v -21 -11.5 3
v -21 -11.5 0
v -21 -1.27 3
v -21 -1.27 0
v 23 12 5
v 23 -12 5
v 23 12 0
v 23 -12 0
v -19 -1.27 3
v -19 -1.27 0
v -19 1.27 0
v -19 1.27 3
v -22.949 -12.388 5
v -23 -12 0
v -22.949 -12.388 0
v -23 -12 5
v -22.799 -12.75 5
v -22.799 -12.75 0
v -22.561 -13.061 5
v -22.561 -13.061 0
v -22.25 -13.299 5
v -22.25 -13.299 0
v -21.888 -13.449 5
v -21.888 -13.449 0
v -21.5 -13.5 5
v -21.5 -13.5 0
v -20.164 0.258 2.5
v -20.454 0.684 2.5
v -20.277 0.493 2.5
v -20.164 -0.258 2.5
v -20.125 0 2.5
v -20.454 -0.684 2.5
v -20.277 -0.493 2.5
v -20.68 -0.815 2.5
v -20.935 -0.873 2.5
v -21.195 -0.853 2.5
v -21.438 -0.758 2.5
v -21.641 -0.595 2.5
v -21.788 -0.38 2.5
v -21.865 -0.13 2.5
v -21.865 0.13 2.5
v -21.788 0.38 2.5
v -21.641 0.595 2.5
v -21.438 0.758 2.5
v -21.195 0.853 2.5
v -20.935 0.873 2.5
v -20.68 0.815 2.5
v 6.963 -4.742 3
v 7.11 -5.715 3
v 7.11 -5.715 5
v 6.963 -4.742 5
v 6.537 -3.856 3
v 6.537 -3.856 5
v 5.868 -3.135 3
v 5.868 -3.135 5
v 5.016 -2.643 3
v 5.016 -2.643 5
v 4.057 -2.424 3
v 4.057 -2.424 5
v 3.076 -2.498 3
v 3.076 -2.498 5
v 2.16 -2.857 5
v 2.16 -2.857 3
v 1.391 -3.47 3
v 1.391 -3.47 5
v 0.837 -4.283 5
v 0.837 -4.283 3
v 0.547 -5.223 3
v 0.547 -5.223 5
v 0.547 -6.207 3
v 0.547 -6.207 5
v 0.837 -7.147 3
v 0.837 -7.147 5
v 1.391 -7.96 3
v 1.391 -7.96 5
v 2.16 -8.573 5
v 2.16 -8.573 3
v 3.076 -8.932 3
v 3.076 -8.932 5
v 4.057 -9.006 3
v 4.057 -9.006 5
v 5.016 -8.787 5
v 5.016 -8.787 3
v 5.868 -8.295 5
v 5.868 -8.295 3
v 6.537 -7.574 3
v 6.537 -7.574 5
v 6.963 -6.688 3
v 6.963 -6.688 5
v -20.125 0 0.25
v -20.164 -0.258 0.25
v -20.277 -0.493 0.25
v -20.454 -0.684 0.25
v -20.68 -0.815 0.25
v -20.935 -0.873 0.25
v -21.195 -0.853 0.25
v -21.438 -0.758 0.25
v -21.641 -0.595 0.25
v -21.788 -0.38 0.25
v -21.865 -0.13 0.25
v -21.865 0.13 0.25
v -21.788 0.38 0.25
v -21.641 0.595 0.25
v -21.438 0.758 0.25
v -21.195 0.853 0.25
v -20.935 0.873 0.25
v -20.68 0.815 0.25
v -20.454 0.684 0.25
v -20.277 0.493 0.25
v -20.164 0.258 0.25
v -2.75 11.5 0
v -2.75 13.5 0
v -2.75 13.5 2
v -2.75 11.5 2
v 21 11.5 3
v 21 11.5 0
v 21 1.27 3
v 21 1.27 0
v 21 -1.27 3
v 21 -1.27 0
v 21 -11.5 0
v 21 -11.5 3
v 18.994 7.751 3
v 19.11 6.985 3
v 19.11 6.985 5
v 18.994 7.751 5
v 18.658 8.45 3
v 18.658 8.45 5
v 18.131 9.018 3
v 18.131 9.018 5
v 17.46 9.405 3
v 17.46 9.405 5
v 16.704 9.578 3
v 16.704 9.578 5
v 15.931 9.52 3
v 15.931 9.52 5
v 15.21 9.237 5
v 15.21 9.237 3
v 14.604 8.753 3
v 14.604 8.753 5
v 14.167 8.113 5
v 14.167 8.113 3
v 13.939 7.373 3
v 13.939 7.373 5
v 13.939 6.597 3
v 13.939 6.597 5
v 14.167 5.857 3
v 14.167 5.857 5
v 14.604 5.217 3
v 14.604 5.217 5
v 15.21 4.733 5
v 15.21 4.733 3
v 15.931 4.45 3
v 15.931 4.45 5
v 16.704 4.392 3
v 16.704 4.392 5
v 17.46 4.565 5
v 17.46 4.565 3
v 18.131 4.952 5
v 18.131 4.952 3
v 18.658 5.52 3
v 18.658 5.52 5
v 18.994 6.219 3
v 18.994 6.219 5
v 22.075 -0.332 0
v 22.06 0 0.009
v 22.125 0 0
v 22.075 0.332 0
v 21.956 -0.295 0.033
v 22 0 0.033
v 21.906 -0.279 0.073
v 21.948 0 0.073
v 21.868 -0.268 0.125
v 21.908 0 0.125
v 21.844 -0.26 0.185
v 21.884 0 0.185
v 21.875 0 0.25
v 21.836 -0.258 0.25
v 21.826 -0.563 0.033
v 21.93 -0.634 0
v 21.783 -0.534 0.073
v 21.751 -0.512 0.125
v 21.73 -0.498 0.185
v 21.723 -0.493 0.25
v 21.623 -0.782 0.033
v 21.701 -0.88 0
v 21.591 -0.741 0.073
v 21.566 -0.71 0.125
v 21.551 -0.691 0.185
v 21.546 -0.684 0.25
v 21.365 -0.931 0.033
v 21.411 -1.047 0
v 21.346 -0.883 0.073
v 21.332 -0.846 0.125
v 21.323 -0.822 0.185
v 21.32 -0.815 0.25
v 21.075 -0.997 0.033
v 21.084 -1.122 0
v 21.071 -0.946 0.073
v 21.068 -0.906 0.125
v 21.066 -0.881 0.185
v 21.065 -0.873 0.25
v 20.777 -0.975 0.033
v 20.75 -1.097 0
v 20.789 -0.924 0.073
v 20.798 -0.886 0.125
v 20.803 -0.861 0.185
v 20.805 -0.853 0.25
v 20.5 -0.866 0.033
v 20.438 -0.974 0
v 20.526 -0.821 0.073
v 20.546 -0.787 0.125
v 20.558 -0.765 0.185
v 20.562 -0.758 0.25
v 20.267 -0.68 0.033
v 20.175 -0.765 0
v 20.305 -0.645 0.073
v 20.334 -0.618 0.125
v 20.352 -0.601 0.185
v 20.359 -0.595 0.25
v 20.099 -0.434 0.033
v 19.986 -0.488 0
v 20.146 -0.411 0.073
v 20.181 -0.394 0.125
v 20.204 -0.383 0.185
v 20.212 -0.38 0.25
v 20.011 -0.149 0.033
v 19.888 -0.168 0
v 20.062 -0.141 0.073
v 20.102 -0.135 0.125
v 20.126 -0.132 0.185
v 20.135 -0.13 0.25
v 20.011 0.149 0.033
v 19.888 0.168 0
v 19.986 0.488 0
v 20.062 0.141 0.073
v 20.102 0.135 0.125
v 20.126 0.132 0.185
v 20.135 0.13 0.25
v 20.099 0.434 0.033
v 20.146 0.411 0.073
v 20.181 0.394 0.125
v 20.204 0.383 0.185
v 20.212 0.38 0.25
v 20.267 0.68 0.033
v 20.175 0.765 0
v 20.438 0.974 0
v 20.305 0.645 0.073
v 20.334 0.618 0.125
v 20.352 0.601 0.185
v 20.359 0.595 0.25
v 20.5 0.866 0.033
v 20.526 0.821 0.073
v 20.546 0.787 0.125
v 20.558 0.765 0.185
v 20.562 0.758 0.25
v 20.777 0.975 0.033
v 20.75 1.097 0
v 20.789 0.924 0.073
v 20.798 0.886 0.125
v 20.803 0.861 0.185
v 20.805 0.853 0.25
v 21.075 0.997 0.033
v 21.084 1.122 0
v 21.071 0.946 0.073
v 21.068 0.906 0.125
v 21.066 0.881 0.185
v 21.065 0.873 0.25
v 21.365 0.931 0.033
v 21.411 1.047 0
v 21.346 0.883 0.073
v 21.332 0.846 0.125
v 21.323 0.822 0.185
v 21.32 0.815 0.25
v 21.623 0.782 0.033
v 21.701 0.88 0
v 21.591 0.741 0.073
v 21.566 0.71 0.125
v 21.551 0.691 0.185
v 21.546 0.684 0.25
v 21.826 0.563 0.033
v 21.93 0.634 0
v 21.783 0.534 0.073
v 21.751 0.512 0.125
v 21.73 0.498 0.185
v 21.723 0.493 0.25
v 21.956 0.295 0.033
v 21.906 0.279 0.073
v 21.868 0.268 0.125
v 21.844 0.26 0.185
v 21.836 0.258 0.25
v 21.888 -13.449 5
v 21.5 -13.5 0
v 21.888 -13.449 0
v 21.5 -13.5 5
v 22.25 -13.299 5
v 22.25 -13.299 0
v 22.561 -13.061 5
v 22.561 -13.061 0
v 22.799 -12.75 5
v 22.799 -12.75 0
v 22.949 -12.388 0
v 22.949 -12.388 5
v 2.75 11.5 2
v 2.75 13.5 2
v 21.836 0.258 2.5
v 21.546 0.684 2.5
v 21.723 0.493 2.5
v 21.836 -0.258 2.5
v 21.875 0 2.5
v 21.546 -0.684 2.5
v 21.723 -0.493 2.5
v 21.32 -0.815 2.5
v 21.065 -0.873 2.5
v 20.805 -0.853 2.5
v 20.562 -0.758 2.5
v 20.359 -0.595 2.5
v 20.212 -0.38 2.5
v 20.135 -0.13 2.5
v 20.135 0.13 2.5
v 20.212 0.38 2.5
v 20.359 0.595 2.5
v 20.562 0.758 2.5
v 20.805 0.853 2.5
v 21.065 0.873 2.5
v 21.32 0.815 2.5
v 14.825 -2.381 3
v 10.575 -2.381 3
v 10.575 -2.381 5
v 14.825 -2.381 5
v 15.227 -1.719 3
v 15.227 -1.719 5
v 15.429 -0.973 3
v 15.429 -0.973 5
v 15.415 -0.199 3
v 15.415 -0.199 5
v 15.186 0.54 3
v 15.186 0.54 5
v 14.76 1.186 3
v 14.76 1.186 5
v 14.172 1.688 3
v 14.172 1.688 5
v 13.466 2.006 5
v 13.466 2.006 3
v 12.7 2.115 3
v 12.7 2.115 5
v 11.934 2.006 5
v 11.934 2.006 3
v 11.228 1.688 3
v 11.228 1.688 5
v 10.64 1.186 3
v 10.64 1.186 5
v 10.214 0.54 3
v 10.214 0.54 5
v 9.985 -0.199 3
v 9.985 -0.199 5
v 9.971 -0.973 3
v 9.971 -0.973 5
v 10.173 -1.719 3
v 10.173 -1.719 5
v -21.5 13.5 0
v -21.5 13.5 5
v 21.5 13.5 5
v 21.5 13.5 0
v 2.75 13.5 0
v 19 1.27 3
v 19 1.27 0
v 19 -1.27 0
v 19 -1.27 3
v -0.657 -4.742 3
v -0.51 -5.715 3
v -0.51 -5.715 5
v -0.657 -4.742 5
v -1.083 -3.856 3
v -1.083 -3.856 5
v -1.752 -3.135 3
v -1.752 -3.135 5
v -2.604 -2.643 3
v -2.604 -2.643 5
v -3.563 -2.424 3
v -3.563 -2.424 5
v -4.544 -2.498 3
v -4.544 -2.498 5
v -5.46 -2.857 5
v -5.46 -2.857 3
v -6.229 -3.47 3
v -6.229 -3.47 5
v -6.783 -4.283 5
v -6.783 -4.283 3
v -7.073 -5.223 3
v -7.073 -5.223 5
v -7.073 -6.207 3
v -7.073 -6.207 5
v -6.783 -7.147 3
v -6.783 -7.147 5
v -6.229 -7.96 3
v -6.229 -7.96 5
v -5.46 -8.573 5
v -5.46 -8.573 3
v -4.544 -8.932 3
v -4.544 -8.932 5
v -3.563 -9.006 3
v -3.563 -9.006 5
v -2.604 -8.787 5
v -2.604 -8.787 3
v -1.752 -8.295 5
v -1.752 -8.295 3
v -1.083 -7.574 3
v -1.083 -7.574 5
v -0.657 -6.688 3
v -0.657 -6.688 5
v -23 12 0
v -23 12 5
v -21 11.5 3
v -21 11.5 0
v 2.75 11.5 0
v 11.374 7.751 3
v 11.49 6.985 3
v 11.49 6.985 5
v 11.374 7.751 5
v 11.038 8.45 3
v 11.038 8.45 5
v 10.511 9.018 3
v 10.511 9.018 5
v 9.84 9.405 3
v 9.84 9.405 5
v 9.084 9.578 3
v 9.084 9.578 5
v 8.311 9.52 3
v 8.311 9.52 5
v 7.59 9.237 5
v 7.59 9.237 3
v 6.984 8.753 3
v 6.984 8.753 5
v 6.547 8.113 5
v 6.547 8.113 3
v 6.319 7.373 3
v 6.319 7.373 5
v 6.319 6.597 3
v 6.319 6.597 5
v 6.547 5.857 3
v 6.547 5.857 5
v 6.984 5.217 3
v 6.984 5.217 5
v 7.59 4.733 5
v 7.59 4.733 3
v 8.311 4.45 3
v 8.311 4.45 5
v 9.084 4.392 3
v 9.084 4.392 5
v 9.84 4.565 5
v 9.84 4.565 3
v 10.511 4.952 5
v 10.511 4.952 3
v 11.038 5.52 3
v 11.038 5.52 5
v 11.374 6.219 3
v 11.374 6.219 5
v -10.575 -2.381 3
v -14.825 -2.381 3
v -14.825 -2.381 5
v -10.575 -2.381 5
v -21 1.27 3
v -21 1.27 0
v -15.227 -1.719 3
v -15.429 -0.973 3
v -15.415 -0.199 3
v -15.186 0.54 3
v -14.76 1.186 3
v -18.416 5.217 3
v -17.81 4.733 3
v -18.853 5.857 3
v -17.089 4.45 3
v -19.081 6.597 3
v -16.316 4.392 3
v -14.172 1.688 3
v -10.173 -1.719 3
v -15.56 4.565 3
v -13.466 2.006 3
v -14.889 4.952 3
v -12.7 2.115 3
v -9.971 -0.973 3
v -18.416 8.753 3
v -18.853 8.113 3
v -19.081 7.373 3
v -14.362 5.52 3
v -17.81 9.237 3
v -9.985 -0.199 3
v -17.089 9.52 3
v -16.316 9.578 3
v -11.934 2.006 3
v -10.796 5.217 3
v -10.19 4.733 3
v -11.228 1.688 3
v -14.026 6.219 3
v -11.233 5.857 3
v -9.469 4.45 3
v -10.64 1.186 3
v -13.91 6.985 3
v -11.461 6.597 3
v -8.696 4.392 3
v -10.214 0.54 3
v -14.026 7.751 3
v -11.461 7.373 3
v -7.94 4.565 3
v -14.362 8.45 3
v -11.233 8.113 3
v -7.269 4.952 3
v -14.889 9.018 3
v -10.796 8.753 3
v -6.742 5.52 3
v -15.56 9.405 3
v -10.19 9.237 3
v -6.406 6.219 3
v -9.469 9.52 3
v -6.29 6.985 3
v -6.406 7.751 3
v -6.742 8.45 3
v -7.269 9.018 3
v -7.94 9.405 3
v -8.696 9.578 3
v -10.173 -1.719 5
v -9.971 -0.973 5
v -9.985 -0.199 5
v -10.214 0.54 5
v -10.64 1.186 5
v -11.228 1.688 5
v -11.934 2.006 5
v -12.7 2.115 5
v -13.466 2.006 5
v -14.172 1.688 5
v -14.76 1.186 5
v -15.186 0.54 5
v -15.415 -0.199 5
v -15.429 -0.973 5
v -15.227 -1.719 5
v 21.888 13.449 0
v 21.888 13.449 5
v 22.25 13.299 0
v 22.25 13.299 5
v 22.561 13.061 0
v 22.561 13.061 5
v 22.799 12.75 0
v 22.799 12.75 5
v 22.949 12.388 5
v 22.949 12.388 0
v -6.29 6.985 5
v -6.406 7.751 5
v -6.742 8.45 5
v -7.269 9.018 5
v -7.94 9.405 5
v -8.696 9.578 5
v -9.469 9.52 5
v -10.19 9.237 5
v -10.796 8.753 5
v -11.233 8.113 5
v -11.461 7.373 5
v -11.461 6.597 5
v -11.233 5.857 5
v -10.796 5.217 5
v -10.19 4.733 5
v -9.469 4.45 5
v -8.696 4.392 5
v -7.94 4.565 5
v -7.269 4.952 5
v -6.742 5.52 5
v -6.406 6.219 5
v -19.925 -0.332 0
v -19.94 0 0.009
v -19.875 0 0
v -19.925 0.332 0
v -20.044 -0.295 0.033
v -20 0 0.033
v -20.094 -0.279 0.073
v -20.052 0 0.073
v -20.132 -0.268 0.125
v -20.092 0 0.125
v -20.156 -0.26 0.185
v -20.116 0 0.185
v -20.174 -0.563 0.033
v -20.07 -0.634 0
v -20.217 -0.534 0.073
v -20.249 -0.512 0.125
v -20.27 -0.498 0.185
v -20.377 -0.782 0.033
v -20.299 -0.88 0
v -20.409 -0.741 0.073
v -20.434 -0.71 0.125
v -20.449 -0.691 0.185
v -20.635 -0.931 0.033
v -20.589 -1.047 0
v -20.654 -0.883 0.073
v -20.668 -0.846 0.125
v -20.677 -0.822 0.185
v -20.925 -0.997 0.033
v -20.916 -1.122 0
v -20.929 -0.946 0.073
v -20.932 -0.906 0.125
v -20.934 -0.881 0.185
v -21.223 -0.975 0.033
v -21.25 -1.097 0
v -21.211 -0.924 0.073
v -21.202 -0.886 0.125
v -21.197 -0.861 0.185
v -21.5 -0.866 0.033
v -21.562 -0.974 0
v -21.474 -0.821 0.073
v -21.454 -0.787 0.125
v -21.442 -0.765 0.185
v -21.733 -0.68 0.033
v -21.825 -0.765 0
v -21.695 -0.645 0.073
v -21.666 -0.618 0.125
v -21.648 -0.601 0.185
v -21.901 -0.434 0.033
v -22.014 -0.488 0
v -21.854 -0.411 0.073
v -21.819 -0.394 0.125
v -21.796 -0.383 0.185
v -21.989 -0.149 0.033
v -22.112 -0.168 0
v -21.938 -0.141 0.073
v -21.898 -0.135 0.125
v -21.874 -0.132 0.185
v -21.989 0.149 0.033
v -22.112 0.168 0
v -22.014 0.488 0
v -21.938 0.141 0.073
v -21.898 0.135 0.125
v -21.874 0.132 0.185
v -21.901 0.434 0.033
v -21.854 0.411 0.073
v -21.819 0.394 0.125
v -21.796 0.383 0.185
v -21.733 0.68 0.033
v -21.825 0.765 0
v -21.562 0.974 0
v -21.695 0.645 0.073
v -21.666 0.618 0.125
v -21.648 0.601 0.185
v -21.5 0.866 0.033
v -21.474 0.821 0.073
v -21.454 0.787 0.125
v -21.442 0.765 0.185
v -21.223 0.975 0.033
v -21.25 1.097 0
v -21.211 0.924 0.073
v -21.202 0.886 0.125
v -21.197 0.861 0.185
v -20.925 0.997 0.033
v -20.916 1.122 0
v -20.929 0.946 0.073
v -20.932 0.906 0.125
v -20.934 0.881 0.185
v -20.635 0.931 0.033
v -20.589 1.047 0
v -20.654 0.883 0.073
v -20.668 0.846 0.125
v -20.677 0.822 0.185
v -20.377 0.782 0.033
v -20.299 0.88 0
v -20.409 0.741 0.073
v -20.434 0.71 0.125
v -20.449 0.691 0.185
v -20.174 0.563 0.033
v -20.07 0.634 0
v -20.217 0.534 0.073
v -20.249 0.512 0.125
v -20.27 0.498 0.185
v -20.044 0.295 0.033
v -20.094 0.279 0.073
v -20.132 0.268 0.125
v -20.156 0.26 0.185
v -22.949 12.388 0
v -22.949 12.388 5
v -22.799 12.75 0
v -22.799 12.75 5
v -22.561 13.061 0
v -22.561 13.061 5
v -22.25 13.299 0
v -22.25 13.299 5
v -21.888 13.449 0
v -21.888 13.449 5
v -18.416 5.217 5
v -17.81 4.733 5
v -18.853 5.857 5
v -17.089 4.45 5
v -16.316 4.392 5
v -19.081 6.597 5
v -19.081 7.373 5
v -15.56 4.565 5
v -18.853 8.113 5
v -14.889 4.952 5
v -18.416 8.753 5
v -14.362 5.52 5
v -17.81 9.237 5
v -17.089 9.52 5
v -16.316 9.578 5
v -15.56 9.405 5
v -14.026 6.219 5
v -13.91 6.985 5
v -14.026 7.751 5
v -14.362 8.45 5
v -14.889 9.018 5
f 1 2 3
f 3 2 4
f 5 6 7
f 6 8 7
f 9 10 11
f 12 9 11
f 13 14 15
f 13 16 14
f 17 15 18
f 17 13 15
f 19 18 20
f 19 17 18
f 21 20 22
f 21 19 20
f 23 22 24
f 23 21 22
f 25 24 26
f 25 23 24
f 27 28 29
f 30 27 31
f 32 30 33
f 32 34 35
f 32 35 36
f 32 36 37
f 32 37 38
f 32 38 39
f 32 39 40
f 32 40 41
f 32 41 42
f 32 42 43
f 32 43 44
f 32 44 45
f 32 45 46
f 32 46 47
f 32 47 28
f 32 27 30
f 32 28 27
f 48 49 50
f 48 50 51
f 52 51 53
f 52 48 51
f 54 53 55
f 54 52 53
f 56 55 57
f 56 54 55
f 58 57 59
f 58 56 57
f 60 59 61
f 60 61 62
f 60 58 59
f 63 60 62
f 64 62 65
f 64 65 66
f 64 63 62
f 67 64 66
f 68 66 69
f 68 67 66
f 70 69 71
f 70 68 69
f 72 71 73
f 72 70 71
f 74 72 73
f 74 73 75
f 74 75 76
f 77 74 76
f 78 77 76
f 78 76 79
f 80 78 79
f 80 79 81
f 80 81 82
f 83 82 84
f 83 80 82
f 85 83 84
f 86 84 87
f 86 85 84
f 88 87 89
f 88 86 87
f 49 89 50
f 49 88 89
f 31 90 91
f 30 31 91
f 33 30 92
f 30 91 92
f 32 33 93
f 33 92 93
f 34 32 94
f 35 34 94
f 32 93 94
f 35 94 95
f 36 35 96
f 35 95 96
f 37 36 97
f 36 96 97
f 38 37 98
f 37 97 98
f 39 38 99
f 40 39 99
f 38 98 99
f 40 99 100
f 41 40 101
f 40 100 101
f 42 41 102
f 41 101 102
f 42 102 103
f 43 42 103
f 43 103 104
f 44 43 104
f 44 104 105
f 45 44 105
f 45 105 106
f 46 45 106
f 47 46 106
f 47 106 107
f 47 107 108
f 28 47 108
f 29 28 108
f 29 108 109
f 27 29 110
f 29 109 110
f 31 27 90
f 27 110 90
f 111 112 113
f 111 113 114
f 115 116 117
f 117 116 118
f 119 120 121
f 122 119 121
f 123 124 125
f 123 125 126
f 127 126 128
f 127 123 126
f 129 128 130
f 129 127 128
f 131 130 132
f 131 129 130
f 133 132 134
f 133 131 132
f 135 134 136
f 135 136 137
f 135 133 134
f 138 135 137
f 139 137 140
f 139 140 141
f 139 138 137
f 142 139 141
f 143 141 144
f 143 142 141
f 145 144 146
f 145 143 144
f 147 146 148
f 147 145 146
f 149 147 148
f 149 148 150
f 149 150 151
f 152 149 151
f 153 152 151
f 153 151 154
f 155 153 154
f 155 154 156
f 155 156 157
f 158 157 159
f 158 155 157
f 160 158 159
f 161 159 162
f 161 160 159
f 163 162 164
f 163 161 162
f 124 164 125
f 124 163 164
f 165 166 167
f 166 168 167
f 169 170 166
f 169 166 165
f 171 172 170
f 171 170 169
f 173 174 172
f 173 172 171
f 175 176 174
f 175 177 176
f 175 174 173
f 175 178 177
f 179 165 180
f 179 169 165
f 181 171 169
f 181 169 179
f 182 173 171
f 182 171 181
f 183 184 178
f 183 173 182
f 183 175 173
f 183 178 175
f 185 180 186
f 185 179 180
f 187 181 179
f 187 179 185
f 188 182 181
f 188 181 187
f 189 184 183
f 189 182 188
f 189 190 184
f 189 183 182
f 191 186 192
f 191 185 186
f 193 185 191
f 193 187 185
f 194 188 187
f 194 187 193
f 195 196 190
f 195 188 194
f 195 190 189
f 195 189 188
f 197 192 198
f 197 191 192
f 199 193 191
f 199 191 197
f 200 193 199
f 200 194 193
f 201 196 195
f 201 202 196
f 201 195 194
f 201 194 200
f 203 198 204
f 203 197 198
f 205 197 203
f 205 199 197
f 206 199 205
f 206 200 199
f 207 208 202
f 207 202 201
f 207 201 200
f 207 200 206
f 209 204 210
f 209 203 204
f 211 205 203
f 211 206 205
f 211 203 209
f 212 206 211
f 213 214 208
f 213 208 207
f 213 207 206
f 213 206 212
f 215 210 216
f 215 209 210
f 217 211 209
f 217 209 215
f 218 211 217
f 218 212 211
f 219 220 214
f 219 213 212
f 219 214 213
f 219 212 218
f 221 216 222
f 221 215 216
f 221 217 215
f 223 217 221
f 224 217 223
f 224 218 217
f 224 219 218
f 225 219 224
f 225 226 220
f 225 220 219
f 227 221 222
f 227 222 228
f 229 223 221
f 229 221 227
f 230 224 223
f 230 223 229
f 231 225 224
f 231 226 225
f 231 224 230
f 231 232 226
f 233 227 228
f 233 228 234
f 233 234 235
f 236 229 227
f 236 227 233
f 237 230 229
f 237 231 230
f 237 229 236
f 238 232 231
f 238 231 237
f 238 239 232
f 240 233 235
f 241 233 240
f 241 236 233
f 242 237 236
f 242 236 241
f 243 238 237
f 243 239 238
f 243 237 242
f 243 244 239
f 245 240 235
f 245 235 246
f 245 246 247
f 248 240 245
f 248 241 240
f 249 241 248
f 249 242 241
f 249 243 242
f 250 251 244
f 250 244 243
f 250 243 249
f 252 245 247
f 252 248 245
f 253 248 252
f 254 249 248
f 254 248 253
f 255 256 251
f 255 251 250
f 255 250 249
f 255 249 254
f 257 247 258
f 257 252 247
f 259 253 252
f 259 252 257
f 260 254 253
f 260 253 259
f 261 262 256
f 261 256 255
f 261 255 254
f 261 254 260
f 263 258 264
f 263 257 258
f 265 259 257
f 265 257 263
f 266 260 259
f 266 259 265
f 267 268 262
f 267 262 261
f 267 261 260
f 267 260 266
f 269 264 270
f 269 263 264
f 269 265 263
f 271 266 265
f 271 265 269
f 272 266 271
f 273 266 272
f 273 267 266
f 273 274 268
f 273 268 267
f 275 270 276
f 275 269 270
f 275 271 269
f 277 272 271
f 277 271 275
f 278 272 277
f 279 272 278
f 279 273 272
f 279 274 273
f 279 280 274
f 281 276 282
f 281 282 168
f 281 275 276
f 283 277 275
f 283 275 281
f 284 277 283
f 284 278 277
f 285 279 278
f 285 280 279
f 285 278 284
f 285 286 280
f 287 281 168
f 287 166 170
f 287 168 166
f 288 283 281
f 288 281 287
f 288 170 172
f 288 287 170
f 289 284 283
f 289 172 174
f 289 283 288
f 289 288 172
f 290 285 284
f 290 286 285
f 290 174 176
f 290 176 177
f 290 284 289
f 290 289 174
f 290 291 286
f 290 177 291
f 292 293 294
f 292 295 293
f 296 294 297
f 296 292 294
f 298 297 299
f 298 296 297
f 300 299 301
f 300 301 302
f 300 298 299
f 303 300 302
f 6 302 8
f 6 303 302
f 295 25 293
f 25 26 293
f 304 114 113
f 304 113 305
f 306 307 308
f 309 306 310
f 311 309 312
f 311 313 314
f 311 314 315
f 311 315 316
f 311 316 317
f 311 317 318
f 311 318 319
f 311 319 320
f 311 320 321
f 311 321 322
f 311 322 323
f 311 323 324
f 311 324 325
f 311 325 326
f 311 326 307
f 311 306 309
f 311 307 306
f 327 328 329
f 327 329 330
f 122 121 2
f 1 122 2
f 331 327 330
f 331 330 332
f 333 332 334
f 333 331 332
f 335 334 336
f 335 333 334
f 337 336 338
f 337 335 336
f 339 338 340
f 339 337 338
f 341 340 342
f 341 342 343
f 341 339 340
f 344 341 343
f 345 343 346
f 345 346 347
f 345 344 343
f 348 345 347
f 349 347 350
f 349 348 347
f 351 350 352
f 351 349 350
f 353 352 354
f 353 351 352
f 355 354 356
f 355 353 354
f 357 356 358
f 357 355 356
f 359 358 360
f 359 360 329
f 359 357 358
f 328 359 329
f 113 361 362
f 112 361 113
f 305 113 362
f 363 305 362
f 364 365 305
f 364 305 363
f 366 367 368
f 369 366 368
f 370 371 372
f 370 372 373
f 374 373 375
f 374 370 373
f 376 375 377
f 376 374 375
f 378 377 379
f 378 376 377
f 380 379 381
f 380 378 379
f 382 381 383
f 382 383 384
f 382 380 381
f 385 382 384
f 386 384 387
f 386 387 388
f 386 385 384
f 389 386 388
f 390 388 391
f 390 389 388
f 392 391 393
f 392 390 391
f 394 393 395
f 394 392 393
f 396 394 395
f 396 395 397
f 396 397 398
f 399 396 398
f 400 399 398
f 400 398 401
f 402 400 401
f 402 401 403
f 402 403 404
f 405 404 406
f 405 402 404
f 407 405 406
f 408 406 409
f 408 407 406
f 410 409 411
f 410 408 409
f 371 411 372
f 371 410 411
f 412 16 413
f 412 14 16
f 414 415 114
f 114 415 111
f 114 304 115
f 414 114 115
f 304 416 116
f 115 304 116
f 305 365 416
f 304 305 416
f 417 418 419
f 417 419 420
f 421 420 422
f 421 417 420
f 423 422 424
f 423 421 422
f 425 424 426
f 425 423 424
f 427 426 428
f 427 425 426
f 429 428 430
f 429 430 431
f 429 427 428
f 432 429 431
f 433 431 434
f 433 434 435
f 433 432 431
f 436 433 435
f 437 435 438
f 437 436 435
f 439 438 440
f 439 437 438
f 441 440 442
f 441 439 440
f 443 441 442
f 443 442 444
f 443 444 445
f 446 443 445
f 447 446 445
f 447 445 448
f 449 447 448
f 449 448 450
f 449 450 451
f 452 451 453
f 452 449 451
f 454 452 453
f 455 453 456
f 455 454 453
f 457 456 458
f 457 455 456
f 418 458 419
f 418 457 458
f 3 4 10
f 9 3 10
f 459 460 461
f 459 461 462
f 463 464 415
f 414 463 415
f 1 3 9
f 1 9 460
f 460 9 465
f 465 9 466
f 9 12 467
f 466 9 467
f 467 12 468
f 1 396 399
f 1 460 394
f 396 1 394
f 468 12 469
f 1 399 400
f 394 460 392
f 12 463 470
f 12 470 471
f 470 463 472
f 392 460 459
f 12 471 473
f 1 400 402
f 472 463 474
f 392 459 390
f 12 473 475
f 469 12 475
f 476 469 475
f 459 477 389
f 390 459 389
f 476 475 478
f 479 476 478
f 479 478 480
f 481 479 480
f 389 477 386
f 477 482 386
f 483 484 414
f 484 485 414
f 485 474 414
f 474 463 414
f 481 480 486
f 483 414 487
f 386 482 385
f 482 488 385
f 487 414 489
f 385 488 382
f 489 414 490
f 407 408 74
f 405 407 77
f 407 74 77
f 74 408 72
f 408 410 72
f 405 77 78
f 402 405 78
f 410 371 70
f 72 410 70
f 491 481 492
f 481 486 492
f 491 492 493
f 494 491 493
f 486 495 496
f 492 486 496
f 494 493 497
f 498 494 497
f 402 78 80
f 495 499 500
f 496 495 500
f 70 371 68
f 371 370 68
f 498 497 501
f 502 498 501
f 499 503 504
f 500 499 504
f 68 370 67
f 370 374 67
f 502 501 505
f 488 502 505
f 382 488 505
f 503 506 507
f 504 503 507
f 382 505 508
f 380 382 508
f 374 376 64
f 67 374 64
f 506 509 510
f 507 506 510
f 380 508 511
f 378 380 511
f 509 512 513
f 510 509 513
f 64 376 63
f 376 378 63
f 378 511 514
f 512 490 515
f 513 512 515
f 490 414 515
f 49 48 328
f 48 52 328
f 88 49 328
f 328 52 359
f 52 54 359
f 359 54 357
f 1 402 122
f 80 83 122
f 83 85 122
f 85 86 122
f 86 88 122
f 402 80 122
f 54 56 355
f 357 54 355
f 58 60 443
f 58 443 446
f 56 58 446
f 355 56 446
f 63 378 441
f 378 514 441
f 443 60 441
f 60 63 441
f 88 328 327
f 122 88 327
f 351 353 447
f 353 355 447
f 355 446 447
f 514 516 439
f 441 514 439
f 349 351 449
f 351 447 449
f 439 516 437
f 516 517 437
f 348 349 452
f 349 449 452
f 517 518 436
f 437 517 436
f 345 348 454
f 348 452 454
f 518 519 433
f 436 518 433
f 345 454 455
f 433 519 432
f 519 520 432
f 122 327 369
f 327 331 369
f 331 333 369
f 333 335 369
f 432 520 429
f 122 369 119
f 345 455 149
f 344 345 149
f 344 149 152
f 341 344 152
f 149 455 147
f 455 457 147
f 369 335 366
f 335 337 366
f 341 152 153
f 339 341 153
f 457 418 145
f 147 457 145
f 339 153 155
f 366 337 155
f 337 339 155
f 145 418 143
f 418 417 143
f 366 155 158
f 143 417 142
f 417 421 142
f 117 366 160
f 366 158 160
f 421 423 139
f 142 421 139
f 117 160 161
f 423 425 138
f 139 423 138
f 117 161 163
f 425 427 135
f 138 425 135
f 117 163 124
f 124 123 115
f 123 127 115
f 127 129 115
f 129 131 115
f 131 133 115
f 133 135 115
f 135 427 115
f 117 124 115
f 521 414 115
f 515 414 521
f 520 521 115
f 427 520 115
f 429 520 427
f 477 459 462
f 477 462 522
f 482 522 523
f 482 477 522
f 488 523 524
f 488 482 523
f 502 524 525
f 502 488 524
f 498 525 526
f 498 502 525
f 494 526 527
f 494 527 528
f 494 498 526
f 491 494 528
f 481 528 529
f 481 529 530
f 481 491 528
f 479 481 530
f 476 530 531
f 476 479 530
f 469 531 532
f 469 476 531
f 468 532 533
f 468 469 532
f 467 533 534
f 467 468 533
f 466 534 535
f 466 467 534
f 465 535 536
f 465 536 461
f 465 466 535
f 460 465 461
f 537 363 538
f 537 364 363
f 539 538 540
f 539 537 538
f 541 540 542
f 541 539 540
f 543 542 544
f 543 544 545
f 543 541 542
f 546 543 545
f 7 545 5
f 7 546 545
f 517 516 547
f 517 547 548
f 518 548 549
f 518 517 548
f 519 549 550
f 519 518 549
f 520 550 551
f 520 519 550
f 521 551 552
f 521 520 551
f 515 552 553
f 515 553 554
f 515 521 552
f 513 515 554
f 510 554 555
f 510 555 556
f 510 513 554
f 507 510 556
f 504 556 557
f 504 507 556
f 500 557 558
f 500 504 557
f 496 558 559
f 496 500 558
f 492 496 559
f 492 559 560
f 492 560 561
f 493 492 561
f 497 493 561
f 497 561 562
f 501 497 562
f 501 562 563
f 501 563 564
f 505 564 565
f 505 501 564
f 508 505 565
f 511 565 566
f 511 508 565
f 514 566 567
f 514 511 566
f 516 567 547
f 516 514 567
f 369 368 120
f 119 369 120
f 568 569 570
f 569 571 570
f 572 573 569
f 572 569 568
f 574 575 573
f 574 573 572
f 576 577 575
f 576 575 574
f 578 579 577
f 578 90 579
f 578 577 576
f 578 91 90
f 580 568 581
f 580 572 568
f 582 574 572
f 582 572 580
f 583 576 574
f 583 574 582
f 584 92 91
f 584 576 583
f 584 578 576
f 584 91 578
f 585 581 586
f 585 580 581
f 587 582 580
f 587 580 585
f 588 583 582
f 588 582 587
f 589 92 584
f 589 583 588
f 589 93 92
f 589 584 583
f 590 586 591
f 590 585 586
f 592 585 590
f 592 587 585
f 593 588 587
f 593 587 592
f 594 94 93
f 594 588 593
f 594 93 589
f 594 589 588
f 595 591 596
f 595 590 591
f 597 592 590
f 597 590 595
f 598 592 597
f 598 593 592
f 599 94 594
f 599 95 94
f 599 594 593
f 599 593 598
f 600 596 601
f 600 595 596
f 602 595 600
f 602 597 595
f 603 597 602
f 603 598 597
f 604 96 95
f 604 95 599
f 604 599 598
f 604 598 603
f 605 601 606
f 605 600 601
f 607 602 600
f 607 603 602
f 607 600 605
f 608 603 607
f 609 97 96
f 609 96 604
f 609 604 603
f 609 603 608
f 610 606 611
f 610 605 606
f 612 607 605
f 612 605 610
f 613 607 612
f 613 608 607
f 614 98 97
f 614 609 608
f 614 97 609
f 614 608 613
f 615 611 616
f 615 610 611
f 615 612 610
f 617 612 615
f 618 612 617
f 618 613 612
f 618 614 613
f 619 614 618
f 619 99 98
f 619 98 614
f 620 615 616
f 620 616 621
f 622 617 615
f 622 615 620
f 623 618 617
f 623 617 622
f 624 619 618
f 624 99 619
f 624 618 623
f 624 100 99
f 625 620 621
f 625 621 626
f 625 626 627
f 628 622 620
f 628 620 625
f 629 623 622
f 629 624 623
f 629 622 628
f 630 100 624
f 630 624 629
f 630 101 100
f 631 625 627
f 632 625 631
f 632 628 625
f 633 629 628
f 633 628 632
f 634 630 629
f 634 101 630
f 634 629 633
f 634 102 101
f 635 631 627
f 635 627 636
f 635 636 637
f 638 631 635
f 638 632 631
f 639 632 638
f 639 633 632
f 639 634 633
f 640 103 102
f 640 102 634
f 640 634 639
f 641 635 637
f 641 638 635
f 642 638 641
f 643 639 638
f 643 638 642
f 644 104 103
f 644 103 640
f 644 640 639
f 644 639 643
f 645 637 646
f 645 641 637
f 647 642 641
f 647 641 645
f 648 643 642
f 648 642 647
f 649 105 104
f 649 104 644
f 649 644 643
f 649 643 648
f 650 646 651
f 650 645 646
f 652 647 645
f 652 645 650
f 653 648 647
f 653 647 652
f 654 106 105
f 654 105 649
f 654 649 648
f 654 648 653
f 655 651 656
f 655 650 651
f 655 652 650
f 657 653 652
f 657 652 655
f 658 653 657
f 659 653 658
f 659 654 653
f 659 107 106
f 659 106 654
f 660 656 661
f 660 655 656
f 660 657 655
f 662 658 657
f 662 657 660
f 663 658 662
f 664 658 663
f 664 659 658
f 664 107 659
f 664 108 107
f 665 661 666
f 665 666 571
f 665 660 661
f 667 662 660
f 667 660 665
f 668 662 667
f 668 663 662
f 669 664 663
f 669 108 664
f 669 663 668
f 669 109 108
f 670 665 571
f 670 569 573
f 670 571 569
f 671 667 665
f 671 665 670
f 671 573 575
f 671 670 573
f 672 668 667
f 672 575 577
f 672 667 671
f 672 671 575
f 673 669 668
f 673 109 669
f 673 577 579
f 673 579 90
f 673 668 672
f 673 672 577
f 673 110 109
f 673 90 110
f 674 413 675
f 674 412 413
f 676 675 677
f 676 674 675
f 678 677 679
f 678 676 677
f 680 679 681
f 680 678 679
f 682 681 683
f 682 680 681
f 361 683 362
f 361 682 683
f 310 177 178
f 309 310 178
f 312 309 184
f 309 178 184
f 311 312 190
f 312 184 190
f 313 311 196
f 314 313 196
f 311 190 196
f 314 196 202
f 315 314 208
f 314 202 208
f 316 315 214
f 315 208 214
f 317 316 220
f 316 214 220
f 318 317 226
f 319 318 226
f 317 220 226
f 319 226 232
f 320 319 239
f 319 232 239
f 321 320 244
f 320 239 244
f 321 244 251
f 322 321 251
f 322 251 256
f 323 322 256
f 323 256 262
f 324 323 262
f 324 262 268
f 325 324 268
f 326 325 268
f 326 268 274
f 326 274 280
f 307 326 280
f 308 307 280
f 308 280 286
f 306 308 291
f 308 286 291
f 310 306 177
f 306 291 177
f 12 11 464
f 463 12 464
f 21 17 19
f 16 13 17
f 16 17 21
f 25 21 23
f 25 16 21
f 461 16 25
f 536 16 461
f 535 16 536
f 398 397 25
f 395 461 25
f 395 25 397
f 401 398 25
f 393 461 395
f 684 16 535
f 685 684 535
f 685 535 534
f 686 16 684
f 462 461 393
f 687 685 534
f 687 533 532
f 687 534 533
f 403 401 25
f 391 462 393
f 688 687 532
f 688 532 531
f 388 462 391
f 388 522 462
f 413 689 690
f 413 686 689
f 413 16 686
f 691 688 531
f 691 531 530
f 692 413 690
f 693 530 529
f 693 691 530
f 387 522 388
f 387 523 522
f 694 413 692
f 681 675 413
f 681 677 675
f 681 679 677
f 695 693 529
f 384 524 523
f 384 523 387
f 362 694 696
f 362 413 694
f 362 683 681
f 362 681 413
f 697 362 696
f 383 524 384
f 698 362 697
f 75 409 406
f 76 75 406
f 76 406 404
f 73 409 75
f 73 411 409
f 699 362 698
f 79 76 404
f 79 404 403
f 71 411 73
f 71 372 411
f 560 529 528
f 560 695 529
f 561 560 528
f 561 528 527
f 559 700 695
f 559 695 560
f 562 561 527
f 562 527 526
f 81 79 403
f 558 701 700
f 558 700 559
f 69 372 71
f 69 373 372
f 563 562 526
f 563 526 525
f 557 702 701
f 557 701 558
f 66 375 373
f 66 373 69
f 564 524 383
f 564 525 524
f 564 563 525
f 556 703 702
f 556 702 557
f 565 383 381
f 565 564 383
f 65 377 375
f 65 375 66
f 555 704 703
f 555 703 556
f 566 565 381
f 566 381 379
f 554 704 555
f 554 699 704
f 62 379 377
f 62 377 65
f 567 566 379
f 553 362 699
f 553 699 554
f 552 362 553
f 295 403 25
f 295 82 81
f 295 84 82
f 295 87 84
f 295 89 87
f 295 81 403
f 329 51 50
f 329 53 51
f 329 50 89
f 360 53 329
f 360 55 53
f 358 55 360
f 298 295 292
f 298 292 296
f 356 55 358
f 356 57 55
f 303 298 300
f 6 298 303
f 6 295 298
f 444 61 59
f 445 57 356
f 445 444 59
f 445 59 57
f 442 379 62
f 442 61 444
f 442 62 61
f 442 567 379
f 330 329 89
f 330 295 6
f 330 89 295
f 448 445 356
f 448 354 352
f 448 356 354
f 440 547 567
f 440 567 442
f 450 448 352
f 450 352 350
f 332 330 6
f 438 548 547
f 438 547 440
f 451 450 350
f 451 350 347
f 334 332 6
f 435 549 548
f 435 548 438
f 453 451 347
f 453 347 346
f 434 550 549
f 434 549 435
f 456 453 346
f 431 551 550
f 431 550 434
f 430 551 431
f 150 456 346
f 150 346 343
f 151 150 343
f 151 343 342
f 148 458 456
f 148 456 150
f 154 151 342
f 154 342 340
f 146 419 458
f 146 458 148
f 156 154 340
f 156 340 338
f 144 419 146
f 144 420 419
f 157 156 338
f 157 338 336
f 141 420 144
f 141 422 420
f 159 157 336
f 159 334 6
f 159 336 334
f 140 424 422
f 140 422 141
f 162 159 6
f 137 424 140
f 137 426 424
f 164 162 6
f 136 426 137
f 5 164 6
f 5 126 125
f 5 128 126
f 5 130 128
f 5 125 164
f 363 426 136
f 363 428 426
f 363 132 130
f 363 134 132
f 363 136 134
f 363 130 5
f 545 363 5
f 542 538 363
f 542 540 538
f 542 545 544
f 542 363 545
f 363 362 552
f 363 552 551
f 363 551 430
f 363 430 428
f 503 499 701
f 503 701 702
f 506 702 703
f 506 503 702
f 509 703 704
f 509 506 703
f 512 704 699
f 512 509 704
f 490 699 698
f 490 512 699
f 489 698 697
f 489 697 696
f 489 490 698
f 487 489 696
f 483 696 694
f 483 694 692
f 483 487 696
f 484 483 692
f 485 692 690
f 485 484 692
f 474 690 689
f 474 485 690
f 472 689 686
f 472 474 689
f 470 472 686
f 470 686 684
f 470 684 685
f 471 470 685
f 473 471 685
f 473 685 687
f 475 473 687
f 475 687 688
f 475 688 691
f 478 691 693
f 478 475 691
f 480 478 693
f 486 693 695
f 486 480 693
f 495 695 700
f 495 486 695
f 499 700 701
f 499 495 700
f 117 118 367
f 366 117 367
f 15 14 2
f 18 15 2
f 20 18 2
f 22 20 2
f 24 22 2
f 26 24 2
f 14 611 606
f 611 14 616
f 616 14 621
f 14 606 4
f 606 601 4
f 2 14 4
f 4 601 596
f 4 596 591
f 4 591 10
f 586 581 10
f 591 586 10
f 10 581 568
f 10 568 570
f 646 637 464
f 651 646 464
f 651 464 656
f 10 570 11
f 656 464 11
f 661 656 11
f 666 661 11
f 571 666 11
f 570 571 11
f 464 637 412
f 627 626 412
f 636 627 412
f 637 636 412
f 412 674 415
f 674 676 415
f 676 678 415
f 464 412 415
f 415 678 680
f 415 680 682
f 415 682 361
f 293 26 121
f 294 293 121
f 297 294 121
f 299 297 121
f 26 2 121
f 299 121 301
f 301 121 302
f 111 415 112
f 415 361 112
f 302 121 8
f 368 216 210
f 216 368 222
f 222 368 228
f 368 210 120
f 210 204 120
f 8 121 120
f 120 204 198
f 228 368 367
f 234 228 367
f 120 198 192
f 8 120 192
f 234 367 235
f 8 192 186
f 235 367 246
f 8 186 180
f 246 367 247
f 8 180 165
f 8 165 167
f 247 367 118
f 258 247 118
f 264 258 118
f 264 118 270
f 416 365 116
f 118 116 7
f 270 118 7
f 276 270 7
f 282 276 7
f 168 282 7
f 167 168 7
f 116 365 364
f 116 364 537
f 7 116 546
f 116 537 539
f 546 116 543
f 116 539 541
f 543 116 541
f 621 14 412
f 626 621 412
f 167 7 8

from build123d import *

# Parameters (mm, degrees)
SKETCH_W        = 46
SKETCH_H        = 27
PAD_DEPTH       = 3
SKETCH001_W     = 46
SKETCH001_H     = 27
SKETCH001_R     = 2.6
SKETCH001_R_2   = 3.3
PAD001_DEPTH    = 2
SKETCH002_W     = 5.5
SKETCH002_H     = 2
POCKET_DEPTH    = 2
SKETCH003_R     = 0.875
POCKET001_DEPTH = 2.5
FILLET_R        = 1.5
FILLET001_R     = 0.25


with BuildPart() as part:
    # Sketch → Pad (new body)
    with BuildSketch(Plane.XY):
        Rectangle(SKETCH_W, SKETCH_H)
        Polygon((-21, 11.5), (21, 11.5), (21, 1.27), (19, 1.27), (19, -1.27), (21, -1.27), (21, -11.5), (-21, -11.5), (-21, -1.27), (-19, -1.27), (-19, 1.27), (-21, 1.27), align=None, mode=Mode.SUBTRACT)
    extrude(amount=PAD_DEPTH)

    # Sketch001 (on Face18 of Pad) → Pad001 (join)
    with BuildSketch(Plane.XY.offset(3)):
        Rectangle(SKETCH001_W, SKETCH001_H)
        with Locations((-16.51, 6.985)):
            Circle(SKETCH001_R, mode=Mode.SUBTRACT)
        with Locations((-8.89, 6.985)):
            Circle(SKETCH001_R, mode=Mode.SUBTRACT)
        with Locations((8.89, 6.985)):
            Circle(SKETCH001_R, mode=Mode.SUBTRACT)
        with Locations((16.51, 6.985)):
            Circle(SKETCH001_R, mode=Mode.SUBTRACT)
        with Locations((-3.81, -5.715)):
            Circle(SKETCH001_R_2, mode=Mode.SUBTRACT)
        with Locations((3.81, -5.715)):
            Circle(SKETCH001_R_2, mode=Mode.SUBTRACT)
        with BuildLine():
            ThreePointArc((-10.575, -2.38053), (-12.7, 2.115), (-14.825, -2.38053))
            Line((-14.825, -2.38053), (-10.575, -2.38053))
        make_face(mode=Mode.SUBTRACT)
        with BuildLine():
            ThreePointArc((14.825, -2.38053), (12.7, 2.115), (10.575, -2.38053))
            Line((10.575, -2.38053), (14.825, -2.38053))
        make_face(mode=Mode.SUBTRACT)
    extrude(amount=PAD001_DEPTH)

    # Sketch002 (on Face4 of Pad001) → Pocket (cut)
    with BuildSketch(Plane(origin=(0, 0, 0), x_dir=(1, 0, 0), z_dir=(0, 0, -1))):
        with Locations((0, -12.5)):
            Rectangle(SKETCH002_W, SKETCH002_H)
    extrude(amount=-POCKET_DEPTH, mode=Mode.SUBTRACT)

    # Sketch003 (on Face2 of Pocket) → Pocket001 (cut)
    with BuildSketch(Plane(origin=(0, 0, 0), x_dir=(1, 0, 0), z_dir=(0, 0, -1))):
        with Locations((21, 0)):
            Circle(SKETCH003_R)
        with Locations((-21, 0)):
            Circle(SKETCH003_R)
    extrude(amount=-POCKET001_DEPTH, mode=Mode.SUBTRACT)

    # Fillet
    fillet_edges = [part.edges().sort_by_distance(p)[0] for p in [
        (-23, -13.5, 1.5),
        (23, -13.5, 1.5),
        (-23, 13.5, 1.5),
        (23, 13.5, 1.5),
    ]]
    fillet(fillet_edges, radius=FILLET_R)

    # Fillet001
    fillet001_edges = [part.edges().sort_by_distance(p)[0] for p in [
        (-21.875, 0, 0),
        (20.125, 0, 0),
    ]]
    fillet(fillet001_edges, radius=FILLET001_R)


solid = part.part
